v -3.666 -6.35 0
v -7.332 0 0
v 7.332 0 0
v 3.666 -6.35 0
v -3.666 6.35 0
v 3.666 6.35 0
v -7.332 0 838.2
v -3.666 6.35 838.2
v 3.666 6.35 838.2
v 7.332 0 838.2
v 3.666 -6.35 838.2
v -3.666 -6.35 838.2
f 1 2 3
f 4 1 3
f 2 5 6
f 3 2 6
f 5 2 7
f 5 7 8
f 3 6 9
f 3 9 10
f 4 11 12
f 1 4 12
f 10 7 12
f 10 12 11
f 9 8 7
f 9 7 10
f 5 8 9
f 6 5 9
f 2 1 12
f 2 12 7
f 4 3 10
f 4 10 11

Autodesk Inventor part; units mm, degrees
ref_plane "YZ Plane" through (0, 0, 0) normal (1, 0, 0) x (0, 1, 0)
ref_plane "XZ Plane" through (0, 0, 0) normal (0, 1, 0) x (-1, 0, 0)
ref_plane "XY Plane" through (0, 0, 0) normal (0, 0, 1) x (1, 0, 0)
sketch "Sketch1" plane through (0, 0, 0) normal (0, 0, 1) x (1, 0, 0)
  line L0 (3.6662, 6.35) -> (7.3323, 0)
  line L1 (7.3323, 0) -> (3.6662, -6.35)
  line L2 (3.6662, -6.35) -> (-3.6662, -6.35)
  line L3 (-3.6662, -6.35) -> (-7.3323, 0)
  line L4 (-7.3323, 0) -> (-3.6662, 6.35)
  line L5 (-3.6662, 6.35) -> (3.6662, 6.35)
  point P0 (0, 0)
  dimension "d0" = 12.7
  dimension "d1" = 12.7
extrude "Extrusion1" add sketch "Sketch1" along normal blind 838.2
properties part number "33 in hex shaft"
